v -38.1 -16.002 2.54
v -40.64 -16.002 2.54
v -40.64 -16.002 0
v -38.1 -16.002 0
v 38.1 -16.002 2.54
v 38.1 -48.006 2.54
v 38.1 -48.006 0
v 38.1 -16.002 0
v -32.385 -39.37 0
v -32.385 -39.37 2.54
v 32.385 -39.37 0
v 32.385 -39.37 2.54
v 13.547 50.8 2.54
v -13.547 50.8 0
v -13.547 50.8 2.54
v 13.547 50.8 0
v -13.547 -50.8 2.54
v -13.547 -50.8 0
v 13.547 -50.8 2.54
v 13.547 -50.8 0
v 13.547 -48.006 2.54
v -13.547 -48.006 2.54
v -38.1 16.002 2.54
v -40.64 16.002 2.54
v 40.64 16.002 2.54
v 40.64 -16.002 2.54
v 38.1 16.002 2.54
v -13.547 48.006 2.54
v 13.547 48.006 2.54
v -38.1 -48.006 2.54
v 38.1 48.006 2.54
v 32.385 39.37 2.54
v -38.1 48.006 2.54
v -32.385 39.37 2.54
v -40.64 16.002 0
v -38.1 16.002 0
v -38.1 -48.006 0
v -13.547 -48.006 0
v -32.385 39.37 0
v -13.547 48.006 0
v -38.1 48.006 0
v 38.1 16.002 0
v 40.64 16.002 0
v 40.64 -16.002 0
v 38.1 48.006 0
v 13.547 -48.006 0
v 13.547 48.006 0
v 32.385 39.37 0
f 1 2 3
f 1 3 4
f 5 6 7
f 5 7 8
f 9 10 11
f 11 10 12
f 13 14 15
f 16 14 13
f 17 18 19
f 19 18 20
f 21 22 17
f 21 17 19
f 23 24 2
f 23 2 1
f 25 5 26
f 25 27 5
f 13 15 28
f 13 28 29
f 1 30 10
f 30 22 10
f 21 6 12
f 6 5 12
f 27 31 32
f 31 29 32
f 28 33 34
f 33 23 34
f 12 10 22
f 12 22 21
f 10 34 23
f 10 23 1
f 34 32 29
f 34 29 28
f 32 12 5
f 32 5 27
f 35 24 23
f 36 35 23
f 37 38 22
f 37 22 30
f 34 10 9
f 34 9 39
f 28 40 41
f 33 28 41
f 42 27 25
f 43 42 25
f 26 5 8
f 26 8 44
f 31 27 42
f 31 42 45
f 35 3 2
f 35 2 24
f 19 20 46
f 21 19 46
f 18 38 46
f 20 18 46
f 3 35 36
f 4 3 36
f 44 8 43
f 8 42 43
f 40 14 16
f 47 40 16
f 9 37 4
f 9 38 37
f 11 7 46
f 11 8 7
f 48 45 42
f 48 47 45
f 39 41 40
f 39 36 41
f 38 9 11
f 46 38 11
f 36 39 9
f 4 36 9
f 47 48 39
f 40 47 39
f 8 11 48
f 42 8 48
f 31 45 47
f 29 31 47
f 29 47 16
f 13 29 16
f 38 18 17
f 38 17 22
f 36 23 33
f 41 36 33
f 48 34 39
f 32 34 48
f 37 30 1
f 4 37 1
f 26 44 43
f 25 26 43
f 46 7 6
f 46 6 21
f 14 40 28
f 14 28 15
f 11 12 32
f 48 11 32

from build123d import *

# Parameters (mm, degrees)
SKETCH1_W           = 81.28
SKETCH1_H           = 101.6
BOSS_EXTRUDE1_DEPTH = 2.54
SKETCH2_W           = 27.093333333
SKETCH2_H           = 2.794
CUT_EXTRUDE4_DEPTH  = 66.105308539
SKETCH8_W           = 2.54
SKETCH8_H           = 32.004
CUT_EXTRUDE9_DEPTH  = 66.105308539
SKETCH9_W           = 64.77
SKETCH9_H           = 78.74
CUT_EXTRUDE10_DEPTH = 66.105308539


with BuildPart() as part:
    # Sketch1 → Boss-Extrude1 (new body)
    with BuildSketch(Plane.XY):
        Rectangle(SKETCH1_W, SKETCH1_H)
    extrude(amount=BOSS_EXTRUDE1_DEPTH)

    # Sketch2 → Cut-Extrude4 (cut, through all)
    with BuildSketch(Plane(origin=(0, 0, 0), x_dir=(-1, 0, 0), z_dir=(0, 0, -1))):
        with Locations((27.093333333, -49.403)):
            Rectangle(SKETCH2_W, SKETCH2_H)
        with Locations((-27.093333333, -49.403)):
            Rectangle(SKETCH2_W, SKETCH2_H)
        with Locations((-27.093333333, 49.403)):
            Rectangle(SKETCH2_W, SKETCH2_H)
        with Locations((27.093333333, 49.403)):
            Rectangle(SKETCH2_W, SKETCH2_H)
    extrude(amount=-CUT_EXTRUDE4_DEPTH, mode=Mode.SUBTRACT)

    # Sketch8 → Cut-Extrude9 (cut, through all)
    with BuildSketch(Plane.XY.offset(2.54)):
        with Locations((-39.37, -32.004)):
            Rectangle(SKETCH8_W, SKETCH8_H)
        with Locations((-39.37, 32.004)):
            Rectangle(SKETCH8_W, SKETCH8_H)
        with Locations((39.37, 32.004)):
            Rectangle(SKETCH8_W, SKETCH8_H)
        with Locations((39.37, -32.004)):
            Rectangle(SKETCH8_W, SKETCH8_H)
    extrude(amount=-CUT_EXTRUDE9_DEPTH, mode=Mode.SUBTRACT)

    # Sketch9 → Cut-Extrude10 (cut, through all)
    with BuildSketch(Plane.XY.offset(2.54)):
        Rectangle(SKETCH9_W, SKETCH9_H)
    extrude(amount=-CUT_EXTRUDE10_DEPTH, mode=Mode.SUBTRACT)


solid = part.part
